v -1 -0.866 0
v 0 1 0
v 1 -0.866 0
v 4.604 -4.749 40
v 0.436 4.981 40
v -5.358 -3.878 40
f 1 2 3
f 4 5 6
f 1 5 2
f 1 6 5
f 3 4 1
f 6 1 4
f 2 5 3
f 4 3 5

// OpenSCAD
//preview[view:south, tilt:top]

// Draw a path here.
normalized_path = [[[0, 1], [-1, -0.866], [1, -0.866]],[[0, 1, 2]]]; //[draw_polygon:2x2]


scale_factor_x = 5; //[1:25]
scale_factor_y = 5; //[1:25]
twist_angle = 5;//[0:130]
//please set the height, so that the vase looks good. Then size it up in your slicer
height = 40;//[1:500]
linear_extrude(height = height,twist=twist_angle, scale=[scale_factor_x, scale_factor_y]) polygon(normalized_path[0],center = true);
